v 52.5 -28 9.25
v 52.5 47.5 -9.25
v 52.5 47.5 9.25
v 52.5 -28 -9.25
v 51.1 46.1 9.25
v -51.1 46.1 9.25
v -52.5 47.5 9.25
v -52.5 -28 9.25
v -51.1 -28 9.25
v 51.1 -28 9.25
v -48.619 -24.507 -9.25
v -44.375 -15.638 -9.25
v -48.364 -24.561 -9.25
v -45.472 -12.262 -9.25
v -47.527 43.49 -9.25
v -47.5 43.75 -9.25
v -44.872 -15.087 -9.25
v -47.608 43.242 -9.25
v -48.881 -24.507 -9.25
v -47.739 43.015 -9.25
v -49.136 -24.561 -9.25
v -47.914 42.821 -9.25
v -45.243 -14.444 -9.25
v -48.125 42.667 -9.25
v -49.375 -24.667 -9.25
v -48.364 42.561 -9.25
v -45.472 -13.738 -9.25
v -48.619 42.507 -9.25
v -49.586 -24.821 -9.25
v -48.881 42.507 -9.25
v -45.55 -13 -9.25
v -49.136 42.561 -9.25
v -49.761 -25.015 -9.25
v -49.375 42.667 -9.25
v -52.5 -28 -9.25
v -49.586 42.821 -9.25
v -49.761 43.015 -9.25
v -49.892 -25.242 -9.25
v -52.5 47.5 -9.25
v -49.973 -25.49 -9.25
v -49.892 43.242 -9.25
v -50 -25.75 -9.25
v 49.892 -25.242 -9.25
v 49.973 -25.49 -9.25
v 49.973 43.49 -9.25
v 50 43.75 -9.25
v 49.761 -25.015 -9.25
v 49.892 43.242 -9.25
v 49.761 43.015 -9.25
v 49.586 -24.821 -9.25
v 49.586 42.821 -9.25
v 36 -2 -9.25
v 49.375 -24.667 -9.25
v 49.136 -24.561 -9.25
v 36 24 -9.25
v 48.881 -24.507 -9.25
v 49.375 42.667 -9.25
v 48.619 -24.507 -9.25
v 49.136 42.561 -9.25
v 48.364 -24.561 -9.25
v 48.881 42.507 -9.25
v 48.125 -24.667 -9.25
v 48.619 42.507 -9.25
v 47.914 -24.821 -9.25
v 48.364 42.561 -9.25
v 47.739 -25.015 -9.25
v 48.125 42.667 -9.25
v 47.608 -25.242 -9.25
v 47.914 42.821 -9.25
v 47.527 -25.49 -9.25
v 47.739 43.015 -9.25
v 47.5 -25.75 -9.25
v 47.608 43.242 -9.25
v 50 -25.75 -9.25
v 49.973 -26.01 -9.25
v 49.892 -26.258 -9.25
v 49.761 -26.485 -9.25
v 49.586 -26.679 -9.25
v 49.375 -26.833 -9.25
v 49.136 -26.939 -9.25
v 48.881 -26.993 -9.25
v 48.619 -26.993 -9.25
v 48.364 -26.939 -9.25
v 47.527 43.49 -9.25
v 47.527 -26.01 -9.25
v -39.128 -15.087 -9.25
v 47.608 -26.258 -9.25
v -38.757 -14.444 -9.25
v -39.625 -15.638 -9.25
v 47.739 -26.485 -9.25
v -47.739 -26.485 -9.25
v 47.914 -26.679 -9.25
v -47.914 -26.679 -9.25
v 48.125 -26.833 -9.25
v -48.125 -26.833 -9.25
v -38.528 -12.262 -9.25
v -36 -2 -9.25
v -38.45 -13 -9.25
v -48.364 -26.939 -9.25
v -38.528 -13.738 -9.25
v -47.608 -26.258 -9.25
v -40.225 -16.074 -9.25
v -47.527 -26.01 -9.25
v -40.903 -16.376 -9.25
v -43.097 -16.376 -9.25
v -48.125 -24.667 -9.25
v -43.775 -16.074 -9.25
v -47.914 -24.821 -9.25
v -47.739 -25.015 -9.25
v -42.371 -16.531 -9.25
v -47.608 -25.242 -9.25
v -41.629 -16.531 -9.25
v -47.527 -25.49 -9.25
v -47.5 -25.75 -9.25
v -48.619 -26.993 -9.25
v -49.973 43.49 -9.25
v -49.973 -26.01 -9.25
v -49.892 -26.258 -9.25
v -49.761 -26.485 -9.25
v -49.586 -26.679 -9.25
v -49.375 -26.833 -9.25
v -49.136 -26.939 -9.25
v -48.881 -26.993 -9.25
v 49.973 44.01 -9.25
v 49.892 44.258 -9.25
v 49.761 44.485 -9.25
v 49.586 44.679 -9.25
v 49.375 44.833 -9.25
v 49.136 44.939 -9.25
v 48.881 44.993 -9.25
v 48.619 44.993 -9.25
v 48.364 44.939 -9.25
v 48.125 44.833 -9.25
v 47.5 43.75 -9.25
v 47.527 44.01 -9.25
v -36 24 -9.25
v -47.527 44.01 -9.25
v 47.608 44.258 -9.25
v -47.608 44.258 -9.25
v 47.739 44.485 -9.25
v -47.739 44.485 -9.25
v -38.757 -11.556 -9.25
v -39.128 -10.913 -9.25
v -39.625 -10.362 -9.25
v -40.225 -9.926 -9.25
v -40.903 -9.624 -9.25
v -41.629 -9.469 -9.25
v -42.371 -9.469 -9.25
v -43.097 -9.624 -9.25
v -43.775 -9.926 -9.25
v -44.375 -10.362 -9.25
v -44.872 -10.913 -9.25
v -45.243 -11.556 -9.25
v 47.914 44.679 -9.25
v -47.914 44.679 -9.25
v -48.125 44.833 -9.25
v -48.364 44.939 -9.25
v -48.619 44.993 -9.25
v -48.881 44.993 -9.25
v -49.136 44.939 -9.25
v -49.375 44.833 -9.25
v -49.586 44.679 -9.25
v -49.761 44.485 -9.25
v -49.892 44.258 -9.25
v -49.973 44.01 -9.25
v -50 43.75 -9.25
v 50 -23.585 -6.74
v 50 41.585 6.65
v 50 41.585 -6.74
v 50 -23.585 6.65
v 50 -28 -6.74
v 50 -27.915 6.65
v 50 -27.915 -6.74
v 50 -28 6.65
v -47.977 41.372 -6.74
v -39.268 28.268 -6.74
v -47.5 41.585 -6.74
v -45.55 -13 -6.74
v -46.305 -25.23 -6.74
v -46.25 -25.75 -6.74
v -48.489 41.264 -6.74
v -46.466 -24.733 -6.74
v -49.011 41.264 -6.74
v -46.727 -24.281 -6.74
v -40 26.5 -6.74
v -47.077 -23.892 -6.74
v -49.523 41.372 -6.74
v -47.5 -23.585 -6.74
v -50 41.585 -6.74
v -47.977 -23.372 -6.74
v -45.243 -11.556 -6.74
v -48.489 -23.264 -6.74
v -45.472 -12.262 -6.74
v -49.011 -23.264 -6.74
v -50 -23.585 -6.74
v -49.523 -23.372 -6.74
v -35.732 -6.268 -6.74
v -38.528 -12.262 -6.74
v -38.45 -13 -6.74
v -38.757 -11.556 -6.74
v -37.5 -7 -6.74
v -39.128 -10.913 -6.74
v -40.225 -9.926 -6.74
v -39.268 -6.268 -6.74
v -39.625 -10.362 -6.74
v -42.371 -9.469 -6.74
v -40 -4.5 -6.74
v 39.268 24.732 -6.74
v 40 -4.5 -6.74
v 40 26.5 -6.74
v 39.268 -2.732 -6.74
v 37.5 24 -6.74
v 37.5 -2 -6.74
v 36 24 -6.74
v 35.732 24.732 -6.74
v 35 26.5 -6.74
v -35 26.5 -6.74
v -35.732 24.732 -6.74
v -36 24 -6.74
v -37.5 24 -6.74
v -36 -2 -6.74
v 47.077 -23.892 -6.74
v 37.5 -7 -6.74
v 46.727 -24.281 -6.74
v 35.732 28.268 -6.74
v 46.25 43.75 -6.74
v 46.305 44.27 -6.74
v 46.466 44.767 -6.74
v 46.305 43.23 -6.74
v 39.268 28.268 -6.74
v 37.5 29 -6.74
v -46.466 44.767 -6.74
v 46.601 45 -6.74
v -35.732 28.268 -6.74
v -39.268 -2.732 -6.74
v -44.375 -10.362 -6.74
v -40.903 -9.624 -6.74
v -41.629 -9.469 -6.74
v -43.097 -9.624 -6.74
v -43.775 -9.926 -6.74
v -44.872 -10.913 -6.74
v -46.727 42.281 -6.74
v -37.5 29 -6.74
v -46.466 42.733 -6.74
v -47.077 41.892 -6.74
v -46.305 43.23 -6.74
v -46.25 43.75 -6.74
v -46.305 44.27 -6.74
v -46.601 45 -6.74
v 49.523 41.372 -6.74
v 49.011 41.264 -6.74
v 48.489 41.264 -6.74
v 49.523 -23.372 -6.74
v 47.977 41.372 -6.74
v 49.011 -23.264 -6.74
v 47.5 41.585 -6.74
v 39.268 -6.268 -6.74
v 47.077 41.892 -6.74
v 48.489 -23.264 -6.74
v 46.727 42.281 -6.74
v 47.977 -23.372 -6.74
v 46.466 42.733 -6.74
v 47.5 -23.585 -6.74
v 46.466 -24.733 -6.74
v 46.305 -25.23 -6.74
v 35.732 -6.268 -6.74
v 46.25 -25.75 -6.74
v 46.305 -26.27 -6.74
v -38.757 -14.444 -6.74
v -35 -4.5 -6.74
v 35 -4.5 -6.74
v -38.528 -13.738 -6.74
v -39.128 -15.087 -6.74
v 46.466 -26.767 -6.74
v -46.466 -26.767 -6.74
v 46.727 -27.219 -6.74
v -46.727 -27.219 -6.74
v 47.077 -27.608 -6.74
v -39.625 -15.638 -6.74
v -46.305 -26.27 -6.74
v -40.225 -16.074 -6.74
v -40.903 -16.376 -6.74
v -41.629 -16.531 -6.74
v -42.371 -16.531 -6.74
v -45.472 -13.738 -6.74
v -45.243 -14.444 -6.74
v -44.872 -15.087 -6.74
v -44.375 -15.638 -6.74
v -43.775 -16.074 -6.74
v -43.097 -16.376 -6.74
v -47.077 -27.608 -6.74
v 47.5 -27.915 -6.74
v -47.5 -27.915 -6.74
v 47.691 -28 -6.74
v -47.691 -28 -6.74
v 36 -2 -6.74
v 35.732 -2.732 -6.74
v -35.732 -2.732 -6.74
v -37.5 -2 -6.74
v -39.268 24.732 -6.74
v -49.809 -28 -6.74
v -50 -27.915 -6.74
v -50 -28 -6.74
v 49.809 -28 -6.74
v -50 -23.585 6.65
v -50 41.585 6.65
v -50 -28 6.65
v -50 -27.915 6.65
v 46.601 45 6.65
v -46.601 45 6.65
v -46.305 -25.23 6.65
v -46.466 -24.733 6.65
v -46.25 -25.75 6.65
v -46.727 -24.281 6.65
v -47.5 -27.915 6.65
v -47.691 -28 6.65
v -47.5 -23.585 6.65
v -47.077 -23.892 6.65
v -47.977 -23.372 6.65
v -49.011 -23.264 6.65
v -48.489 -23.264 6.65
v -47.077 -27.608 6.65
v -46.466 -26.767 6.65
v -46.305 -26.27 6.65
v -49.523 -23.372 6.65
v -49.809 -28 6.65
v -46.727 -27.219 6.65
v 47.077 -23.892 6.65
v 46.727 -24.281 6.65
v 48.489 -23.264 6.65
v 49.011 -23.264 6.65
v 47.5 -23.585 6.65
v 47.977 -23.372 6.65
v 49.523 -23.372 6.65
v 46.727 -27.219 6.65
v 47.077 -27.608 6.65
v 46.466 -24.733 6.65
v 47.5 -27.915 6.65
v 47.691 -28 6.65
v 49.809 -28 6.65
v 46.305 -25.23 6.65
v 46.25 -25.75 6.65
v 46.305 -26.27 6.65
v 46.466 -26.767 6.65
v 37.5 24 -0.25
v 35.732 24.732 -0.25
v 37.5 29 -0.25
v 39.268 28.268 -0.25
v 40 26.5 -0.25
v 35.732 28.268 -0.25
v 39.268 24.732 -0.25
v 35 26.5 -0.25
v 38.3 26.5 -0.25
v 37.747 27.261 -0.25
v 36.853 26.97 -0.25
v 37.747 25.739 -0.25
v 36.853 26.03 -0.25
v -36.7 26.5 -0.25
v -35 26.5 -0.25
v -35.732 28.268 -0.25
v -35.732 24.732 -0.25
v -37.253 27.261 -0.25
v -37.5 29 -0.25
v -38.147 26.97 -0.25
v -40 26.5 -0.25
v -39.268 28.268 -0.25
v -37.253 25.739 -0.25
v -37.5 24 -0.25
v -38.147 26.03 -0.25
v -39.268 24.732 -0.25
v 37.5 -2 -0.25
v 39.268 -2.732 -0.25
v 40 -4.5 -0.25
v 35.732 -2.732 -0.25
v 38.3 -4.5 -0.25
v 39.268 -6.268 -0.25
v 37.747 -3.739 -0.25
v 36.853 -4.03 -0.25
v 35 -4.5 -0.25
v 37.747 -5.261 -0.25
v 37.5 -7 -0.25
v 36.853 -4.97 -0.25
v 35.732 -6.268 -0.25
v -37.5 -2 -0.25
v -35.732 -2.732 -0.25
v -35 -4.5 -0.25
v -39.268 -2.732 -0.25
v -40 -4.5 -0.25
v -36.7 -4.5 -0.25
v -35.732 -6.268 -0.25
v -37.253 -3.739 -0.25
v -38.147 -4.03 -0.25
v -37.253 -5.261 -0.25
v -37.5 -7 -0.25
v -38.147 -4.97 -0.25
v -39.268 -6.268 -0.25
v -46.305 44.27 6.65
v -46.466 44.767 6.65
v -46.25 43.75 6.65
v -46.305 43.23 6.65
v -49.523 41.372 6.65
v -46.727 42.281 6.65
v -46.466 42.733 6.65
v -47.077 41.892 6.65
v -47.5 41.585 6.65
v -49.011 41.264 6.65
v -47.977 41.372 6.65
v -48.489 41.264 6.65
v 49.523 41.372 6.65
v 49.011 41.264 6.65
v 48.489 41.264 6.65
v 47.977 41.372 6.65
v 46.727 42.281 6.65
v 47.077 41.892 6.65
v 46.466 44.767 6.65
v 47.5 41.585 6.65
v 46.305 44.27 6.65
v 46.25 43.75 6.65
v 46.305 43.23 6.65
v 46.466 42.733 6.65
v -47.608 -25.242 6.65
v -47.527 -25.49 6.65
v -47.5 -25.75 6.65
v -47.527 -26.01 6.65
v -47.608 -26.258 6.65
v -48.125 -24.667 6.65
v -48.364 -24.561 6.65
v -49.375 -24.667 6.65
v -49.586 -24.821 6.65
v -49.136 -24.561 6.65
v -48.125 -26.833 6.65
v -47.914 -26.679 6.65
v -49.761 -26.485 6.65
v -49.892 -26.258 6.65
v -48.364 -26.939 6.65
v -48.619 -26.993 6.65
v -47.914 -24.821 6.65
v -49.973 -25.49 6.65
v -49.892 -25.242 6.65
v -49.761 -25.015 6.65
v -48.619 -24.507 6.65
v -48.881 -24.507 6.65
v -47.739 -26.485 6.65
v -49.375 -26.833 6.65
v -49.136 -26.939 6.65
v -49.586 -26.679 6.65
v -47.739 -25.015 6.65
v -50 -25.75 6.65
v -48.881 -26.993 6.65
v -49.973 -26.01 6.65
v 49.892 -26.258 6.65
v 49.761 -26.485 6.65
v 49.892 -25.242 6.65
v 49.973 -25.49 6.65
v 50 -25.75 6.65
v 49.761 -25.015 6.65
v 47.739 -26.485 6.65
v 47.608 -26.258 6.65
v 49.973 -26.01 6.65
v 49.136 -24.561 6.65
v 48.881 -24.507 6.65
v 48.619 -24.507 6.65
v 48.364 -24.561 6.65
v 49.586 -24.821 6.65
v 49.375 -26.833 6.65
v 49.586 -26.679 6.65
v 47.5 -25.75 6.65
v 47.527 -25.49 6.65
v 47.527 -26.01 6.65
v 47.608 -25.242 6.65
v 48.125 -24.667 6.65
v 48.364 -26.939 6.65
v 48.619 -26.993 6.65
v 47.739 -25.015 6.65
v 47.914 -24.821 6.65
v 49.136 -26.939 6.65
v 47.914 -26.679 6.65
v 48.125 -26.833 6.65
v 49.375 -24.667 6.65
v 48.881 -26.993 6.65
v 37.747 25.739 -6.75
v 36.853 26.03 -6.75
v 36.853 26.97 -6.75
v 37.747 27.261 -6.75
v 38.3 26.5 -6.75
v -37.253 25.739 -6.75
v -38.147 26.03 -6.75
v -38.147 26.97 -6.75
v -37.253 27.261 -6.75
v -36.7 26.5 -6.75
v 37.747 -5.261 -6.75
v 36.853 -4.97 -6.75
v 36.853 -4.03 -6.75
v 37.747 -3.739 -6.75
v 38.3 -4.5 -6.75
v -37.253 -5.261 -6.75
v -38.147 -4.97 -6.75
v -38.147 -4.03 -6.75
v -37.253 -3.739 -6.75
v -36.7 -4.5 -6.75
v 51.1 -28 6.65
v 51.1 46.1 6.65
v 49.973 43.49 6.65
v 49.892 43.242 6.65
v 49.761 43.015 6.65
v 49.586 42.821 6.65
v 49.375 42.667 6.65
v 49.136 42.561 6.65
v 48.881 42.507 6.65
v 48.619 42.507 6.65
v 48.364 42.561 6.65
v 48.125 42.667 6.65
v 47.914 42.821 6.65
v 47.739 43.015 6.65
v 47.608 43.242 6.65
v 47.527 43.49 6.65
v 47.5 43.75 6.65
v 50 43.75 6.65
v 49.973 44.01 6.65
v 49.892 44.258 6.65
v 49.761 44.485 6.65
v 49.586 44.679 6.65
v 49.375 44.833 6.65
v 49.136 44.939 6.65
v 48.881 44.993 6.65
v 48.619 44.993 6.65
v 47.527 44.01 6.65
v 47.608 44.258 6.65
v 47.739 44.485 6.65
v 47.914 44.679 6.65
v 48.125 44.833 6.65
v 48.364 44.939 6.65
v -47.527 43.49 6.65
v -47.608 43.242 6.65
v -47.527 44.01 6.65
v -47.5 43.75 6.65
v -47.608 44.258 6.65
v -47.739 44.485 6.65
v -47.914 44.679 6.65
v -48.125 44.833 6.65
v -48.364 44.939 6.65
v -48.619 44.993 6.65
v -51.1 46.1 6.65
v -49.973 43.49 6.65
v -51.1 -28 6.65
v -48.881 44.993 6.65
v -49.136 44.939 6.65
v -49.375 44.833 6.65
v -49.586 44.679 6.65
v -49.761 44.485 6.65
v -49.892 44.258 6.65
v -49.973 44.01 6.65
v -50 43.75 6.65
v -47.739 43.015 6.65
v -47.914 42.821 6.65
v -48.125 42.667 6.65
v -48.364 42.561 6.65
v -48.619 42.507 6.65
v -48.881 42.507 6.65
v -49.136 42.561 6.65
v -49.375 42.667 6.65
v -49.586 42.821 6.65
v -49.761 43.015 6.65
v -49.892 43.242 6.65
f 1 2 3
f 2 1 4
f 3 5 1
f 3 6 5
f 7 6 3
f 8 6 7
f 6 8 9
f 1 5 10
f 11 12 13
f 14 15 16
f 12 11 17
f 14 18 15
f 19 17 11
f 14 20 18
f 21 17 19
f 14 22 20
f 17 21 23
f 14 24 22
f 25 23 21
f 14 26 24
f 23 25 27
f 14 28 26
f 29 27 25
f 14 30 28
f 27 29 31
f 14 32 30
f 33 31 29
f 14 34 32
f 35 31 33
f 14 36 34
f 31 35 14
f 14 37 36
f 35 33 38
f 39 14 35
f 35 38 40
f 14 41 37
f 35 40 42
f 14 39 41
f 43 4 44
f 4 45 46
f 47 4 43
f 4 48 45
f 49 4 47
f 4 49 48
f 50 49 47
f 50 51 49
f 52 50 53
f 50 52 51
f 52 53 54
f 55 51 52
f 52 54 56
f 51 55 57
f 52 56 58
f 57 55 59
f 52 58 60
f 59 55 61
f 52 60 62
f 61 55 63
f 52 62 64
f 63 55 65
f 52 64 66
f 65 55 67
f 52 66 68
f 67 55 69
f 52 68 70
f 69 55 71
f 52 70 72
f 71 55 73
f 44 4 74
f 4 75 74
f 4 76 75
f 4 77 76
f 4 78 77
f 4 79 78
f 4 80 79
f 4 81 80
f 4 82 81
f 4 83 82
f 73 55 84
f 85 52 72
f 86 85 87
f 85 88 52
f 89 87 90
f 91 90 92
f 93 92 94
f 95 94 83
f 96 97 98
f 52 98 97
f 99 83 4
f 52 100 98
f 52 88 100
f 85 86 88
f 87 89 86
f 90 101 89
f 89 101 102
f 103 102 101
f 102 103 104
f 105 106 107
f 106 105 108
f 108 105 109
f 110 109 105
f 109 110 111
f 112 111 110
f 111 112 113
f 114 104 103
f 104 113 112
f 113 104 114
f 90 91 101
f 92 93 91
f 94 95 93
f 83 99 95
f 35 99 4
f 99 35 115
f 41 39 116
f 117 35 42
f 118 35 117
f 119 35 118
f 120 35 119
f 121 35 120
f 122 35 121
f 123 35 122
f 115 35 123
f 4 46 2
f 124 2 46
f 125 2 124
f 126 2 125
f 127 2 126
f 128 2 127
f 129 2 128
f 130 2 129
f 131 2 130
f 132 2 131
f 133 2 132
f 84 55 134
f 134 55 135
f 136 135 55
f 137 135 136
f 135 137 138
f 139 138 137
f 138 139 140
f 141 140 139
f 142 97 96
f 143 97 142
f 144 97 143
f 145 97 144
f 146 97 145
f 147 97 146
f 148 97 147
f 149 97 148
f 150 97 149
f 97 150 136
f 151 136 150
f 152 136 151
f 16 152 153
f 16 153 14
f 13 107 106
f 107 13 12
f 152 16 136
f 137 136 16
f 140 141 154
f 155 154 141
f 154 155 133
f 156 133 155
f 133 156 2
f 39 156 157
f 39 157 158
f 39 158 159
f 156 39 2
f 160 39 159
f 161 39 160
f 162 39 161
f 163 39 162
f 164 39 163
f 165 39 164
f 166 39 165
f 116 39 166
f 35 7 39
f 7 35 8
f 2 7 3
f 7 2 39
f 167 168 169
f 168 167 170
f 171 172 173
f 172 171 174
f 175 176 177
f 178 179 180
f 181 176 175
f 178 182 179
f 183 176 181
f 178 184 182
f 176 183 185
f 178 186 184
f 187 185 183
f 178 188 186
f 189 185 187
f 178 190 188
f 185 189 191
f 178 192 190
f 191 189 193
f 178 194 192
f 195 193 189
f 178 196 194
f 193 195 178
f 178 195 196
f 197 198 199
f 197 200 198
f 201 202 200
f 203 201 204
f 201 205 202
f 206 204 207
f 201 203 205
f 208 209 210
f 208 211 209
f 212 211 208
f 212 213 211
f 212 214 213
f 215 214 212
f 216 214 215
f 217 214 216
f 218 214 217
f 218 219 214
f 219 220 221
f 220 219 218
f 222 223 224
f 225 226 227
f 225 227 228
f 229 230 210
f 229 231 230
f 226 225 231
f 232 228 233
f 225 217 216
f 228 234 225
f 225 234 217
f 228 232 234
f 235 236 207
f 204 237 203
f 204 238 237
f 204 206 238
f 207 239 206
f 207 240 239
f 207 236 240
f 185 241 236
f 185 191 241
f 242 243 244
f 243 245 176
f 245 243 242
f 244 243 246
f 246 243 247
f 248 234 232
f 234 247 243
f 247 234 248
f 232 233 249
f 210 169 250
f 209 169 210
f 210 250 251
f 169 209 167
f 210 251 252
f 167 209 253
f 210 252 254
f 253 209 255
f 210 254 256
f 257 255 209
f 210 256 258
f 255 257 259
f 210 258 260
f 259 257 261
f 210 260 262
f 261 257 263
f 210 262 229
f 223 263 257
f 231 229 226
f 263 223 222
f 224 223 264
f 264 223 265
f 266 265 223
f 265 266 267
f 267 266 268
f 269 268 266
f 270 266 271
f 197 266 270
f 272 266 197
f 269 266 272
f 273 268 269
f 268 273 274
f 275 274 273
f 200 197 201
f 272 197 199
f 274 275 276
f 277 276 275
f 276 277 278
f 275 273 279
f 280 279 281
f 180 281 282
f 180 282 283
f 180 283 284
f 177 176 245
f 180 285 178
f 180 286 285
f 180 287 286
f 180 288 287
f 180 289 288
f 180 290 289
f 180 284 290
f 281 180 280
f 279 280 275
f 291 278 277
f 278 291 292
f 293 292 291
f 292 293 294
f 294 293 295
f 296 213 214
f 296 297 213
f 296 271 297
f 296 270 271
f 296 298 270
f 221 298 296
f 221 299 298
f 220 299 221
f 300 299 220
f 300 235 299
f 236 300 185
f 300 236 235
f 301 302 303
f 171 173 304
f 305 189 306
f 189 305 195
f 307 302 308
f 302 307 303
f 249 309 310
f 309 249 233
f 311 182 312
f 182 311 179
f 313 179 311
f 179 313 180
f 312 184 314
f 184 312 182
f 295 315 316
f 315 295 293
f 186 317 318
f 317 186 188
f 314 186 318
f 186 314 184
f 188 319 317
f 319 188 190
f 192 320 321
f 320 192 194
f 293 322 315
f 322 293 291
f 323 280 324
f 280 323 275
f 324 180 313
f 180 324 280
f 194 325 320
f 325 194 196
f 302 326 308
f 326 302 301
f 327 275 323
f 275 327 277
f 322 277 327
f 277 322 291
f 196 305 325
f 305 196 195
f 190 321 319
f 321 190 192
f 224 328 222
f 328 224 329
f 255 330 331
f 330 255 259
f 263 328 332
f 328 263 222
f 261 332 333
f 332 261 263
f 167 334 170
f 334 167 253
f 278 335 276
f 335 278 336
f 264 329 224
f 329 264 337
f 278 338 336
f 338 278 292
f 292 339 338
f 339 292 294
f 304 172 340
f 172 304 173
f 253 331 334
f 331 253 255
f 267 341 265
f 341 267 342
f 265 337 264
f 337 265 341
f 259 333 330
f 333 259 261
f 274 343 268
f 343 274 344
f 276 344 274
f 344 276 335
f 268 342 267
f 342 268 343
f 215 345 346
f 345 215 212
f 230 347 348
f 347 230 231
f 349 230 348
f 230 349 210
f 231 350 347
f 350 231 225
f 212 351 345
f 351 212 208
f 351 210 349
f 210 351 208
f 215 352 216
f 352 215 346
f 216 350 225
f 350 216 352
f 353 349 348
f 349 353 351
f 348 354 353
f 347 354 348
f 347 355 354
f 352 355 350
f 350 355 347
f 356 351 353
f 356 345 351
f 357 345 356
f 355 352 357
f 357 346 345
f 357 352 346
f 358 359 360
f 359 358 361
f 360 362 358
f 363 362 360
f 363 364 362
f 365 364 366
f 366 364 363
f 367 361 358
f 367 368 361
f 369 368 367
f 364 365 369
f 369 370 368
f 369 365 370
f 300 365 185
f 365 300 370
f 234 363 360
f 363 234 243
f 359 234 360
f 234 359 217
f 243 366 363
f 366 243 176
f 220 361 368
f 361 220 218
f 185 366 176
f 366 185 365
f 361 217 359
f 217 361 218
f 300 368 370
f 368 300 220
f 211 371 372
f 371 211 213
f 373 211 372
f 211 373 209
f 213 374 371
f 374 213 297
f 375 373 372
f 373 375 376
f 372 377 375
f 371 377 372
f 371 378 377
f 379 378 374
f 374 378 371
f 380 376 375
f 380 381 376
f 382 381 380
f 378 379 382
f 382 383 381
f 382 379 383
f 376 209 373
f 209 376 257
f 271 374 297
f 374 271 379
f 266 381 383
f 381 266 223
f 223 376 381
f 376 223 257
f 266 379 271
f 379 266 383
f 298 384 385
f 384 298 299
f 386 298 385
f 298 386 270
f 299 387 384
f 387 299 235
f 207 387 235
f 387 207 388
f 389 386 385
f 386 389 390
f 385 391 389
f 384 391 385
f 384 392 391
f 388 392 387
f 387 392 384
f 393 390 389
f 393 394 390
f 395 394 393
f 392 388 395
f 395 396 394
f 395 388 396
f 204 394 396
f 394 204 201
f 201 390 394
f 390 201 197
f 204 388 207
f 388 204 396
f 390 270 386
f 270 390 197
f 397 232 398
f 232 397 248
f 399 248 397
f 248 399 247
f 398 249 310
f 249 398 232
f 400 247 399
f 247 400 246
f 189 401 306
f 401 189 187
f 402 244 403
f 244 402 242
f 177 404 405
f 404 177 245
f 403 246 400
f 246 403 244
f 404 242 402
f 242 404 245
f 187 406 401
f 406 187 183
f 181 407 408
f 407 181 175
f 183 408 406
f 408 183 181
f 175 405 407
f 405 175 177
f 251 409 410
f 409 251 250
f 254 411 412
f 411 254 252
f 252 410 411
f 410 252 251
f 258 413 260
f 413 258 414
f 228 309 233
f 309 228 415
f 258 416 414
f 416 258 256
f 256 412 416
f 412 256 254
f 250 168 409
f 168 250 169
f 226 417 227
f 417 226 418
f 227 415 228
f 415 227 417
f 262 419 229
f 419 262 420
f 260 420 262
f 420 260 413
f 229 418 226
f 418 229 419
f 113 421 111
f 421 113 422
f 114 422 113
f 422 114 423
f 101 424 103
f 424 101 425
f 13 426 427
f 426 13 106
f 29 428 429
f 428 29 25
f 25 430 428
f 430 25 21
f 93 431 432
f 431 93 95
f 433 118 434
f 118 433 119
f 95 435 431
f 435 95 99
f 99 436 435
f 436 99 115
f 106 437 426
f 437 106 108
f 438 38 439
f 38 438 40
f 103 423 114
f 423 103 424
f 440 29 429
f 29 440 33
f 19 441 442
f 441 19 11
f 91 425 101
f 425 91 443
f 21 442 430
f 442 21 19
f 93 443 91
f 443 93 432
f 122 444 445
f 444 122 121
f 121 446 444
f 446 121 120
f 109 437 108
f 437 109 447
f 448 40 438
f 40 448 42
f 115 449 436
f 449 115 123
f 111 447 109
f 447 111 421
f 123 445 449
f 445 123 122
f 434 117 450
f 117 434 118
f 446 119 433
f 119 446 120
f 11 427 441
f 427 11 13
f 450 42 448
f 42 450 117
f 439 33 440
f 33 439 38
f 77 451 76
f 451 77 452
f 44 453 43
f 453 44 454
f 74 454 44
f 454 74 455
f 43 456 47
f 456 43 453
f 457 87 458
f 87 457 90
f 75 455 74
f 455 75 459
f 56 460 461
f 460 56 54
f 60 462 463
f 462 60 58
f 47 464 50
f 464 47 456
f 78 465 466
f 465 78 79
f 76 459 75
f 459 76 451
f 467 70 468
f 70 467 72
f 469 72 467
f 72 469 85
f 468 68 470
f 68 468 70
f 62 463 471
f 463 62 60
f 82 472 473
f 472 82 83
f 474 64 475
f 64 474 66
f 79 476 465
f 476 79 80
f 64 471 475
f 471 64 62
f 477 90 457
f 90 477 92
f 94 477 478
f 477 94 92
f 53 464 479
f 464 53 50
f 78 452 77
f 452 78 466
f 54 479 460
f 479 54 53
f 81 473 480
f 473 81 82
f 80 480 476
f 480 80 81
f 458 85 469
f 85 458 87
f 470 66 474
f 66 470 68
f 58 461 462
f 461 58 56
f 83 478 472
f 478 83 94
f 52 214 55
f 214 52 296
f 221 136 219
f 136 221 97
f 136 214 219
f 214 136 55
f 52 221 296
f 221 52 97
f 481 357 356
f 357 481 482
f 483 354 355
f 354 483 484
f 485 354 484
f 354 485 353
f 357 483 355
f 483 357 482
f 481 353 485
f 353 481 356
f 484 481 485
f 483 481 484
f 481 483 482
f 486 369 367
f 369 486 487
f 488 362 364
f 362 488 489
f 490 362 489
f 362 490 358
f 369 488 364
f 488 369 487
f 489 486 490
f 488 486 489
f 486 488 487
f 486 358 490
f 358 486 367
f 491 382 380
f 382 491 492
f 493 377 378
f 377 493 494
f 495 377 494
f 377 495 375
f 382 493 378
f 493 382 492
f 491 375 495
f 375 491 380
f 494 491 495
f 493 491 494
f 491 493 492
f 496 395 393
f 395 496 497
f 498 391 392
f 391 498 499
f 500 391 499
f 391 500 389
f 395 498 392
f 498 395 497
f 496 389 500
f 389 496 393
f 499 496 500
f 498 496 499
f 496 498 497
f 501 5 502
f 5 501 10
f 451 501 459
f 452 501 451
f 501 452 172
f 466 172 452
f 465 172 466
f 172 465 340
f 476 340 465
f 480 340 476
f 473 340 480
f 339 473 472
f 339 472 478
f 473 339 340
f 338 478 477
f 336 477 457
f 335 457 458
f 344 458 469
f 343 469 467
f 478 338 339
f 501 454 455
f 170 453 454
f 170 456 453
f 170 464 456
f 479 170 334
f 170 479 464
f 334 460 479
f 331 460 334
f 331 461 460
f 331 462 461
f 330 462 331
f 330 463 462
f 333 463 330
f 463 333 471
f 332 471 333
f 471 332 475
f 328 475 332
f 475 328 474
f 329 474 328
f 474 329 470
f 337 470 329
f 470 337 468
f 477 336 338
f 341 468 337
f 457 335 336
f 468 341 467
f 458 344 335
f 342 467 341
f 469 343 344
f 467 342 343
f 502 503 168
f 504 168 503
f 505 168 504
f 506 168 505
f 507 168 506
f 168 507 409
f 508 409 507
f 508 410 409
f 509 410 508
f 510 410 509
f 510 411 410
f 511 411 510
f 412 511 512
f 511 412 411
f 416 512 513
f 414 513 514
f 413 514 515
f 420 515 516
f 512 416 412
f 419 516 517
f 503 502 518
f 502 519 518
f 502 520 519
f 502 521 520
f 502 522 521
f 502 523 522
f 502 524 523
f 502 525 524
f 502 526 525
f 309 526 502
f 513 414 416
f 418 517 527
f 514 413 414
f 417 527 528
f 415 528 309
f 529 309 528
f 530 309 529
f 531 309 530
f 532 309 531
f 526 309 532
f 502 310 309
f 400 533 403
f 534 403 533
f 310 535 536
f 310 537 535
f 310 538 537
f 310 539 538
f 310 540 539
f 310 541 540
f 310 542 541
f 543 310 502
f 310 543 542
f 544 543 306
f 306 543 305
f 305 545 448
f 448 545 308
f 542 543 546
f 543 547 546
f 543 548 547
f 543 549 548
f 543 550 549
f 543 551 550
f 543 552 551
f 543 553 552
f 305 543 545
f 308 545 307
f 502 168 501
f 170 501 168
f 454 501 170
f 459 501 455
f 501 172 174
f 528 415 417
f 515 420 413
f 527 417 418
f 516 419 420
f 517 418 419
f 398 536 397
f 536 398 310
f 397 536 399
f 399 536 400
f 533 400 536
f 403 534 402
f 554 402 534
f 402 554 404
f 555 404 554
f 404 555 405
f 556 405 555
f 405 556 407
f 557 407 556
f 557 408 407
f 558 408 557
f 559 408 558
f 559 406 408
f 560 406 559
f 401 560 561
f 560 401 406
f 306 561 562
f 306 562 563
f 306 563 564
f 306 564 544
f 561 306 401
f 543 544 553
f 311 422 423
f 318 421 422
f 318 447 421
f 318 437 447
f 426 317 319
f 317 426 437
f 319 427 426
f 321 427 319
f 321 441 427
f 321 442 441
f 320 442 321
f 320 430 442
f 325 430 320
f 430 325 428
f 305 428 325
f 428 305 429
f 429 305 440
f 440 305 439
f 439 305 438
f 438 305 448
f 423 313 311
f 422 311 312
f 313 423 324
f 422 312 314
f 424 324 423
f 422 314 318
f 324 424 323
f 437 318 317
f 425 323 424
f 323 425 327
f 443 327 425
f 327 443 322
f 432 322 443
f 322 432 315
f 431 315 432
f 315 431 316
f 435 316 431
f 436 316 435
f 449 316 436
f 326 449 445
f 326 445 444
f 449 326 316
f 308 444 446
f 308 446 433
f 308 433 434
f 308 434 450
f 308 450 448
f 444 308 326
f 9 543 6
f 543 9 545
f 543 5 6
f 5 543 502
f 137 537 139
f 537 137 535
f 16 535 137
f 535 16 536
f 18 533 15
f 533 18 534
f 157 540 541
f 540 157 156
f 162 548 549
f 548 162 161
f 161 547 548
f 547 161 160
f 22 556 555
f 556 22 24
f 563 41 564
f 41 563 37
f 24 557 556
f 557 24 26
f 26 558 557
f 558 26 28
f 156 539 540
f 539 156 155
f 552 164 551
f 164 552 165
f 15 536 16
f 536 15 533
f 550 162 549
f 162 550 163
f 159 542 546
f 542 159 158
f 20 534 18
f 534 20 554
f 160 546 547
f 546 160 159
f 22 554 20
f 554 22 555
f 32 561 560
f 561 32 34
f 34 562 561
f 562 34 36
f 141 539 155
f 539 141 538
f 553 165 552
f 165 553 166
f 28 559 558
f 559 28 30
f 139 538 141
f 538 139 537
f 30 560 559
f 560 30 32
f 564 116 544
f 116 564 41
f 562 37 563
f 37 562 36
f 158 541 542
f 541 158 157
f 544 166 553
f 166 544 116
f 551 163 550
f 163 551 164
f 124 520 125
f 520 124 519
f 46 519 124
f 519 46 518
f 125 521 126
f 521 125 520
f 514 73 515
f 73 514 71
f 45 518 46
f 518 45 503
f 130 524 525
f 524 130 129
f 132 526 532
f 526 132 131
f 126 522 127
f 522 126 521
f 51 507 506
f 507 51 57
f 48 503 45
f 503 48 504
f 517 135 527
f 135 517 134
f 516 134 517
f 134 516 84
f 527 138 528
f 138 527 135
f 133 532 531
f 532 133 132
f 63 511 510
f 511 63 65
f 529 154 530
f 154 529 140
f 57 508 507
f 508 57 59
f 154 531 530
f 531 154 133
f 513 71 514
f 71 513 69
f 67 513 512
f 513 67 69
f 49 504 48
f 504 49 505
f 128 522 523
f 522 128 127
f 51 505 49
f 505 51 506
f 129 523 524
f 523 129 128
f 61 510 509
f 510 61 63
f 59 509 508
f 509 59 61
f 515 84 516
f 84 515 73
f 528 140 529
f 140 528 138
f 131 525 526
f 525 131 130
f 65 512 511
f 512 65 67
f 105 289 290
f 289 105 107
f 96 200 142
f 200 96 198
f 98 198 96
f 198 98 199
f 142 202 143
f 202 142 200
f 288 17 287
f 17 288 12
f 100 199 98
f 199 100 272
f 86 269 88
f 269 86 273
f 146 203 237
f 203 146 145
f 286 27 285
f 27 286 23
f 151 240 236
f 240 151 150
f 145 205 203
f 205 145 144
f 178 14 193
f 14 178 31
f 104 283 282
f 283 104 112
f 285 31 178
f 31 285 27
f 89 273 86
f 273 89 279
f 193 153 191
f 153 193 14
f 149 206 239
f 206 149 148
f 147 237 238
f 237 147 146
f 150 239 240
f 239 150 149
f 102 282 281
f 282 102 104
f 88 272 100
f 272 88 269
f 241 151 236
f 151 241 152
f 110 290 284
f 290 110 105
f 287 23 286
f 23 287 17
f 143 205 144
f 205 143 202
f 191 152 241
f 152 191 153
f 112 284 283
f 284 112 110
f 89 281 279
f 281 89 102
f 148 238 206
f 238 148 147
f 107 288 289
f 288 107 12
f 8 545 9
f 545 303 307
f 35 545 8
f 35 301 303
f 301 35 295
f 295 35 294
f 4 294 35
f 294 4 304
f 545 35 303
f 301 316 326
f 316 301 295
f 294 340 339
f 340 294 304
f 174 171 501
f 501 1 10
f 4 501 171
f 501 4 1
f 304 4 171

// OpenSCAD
xdim=100;
ydim=90;
zdim=25;
zdim2=16;
th=2.5;

BOTTOM=1;
TOP=2;
LCD_TOP=1;
LCD_BOTTOM=2;
part=TOP;
part2=LCD_TOP;
if(part==BOTTOM) {
    difference() 
    {
        union() {
            //box
            difference() {
                cube([xdim+2*th,ydim+2*th,zdim+th],true);
                translate([0,0,th/2+0.01]) cube([xdim,ydim,zdim],true);
            }
            // screw hole/mounts
            translate([0,-th/2+17/2,0]) {
                translate([-(xdim/2-th/2),-(ydim/2-th/2),th/2]) {
                    cylinder(h=zdim,d=5,$fn=30,center=true);
                }
                translate([(xdim/2-th/2),-(ydim/2-th/2),th/2]) {
                    cylinder(h=zdim,d=5,$fn=30,center=true);
                }
            }
            
            translate([-(xdim/2-th/2),(ydim/2-th/2),th/2]) {
                cylinder(h=zdim,d=5,$fn=30,center=true);
            }
            translate([(xdim/2-th/2),(ydim/2-th/2),th/2]) {
                cylinder(h=zdim,d=5,$fn=30,center=true);
            }
            translate([0,18,0]) {
                translate([-(xdim/2-th/2),-(ydim/2-th/2),th/2]) {
                    cylinder(h=zdim,d=5,$fn=30,center=true);
                }
                translate([(xdim/2-th/2),-(ydim/2-th/2),th/2]) {
                    cylinder(h=zdim,d=5,$fn=30,center=true);
                }
            }
            // arduino mounts
            translate([-(xdim/2)+21-th,(ydim/2)-17,-(zdim/2)+5/2+th/2]) {
                cylinder(h=5,d=4.5,$fn=30,center=true);
            }
            translate([-(xdim/2)+21-th-1.3,(ydim/2)-17-48,-(zdim/2)+5/2+th/2]) {
                cylinder(h=5,d=4.5,$fn=30,center=true);
            }
            translate([-(xdim/2)+21-th+64.4-13.6,(ydim/2)-17-15.3,-(zdim/2)+5/2+th/2]) {
                cylinder(h=5,d=4.5,$fn=30,center=true);
            }
            translate([-(xdim/2)+21-th+64.4-13.6,(ydim/2)-17-(44.12-1),-(zdim/2)+5/2+th/2]) {
                cylinder(h=5,d=4.5,$fn=30,center=true);
            }

            
            
            
            // slot
            difference() {
                translate([0,0,zdim/2+th/2-1.5+3-1]) cube([xdim+2,ydim+2,3],true);
                translate([0,0,zdim/2+th/2-1.5+3-1]) cube([xdim,ydim,3.1],true);
            }                
        }
        

        // screw hole/mounts
        translate([0,-th/2+17/2,0]) {
            translate([-(xdim/2-th/2),-(ydim/2-th/2),th/2]) {
                cylinder(h=zdim,d=1.5,$fn=30,center=true);
            }
            translate([(xdim/2-th/2),-(ydim/2-th/2),th/2]) {
                cylinder(h=zdim,d=1.5,$fn=30,center=true);
            }
        }
        translate([-(xdim/2-th/2),(ydim/2-th/2),th/2]) {
            cylinder(h=zdim,d=1.5,$fn=30,center=true);
        }
        translate([(xdim/2-th/2),(ydim/2-th/2),th/2]) {
            cylinder(h=zdim,d=1.5,$fn=30,center=true);
        }
        translate([0,18,0]) {
            translate([-(xdim/2-th/2),-(ydim/2-th/2),th/2]) {
                cylinder(h=zdim,d=1.5,$fn=30,center=true);
            }
            translate([(xdim/2-th/2),-(ydim/2-th/2),th/2]) {
                cylinder(h=zdim,d=1.5,$fn=30,center=true);
            }
        }

        // arduino mounts
        translate([-(xdim/2)+21-th,(ydim/2)-17,-(zdim/2)+5/2+th/2]) {
            cylinder(h=5,d=1.5,$fn=30,center=true);
        }
        translate([-(xdim/2)+21-th-1.3,(ydim/2)-17-48,-(zdim/2)+5/2+th/2]) {
            cylinder(h=5,d=1.5,$fn=30,center=true);
        }
        translate([-(xdim/2)+21-th+64.4-13.6,(ydim/2)-17-15.3,-(zdim/2)+5/2+th/2]) {
            cylinder(h=5,d=1.5,$fn=30,center=true);
        }
        translate([-(xdim/2)+21-th+64.4-13.6,(ydim/2)-17-(44.12-1),-(zdim/2)+5/2+th/2]) {
            cylinder(h=5,d=1.5,$fn=30,center=true);
        }

        // usb
        translate([-(xdim/2),(ydim/2)-17-12.5,-(zdim/2)+th/2+12/2+7]) cube([10,13,12],true);

        // aerial
        translate([21-th-(xdim/2)+74-13.6-1,(ydim/2),-1]) rotate([90,0,0]) cylinder(h=10,d=11,center=true);
        
        // switch
        translate([-xdim/2,-5,11]) rotate([90,0,0]) switch();
        

    }
    
    translate([-15,-(ydim/2)+17./2,-(zdim/2)+th/2+15/2]) battery_holder();
} else if(part==TOP) {
    difference() 
    {
        union() {
            //box
            difference() {
                cube([xdim+2*th,ydim+2*th,zdim2+th],true);
                translate([0,0,th/2+0.01]) cube([xdim,ydim,zdim2],true);
            }
            // screw hole/mounts
            translate([0,-th/2+17/2,0]) {
                translate([-(xdim/2-th/2),-(ydim/2-th/2),th/2]) {
                    cylinder(h=zdim2,d=5,$fn=30,center=true);
                }
                translate([(xdim/2-th/2),-(ydim/2-th/2),th/2]) {
                    cylinder(h=zdim2,d=5,$fn=30,center=true);
                }
            }
            
            translate([-(xdim/2-th/2),(ydim/2-th/2),th/2]) {
                cylinder(h=zdim2,d=5,$fn=30,center=true);
            }
            translate([(xdim/2-th/2),(ydim/2-th/2),th/2]) {
                cylinder(h=zdim2,d=5,$fn=30,center=true);
            }
            translate([0,18,0]) {
                translate([-(xdim/2-th/2),-(ydim/2-th/2),th/2]) {
                    cylinder(h=zdim2,d=5,$fn=30,center=true);
                }
                translate([(xdim/2-th/2),-(ydim/2-th/2),th/2]) {
                    cylinder(h=zdim2,d=5,$fn=30,center=true);
                }
            }
            
            
            // mounts for LCD
            
            // hole for LCD
            translate([0,(ydim/2)-34,-zdim2/2+(9-th)/2+th/2]) {
                translate([75/2,31/2,0]) cylinder(d=5,h=9-th,center=true);
                translate([-75/2,31/2,0]) cylinder(d=5,h=9-th,center=true);
                translate([75/2,-31/2,0]) cylinder(d=5,h=9-th,center=true);
                translate([-75/2,-31/2,0]) cylinder(d=5,h=9-th,center=true);
            }
            
            
        }
        // slot
        translate([0,0,zdim2/2+th/2+2.6/2-2.6]) cube([xdim+2.2,ydim+2.2,2.6],true);
        // screw hole/mounts
        translate([0,-th/2+17/2,0]) {
            translate([-(xdim/2-th/2),-(ydim/2-th/2),th/2]) {
                cylinder(h=zdim,d=2.5,$fn=30,center=true);
            }
            translate([(xdim/2-th/2),-(ydim/2-th/2),th/2]) {
                cylinder(h=zdim,d=2.5,$fn=30,center=true);
            }
        }
        translate([-(xdim/2-th/2),(ydim/2-th/2),th/2]) {
            cylinder(h=zdim,d=2.5,$fn=30,center=true);
        }
        translate([(xdim/2-th/2),(ydim/2-th/2),th/2]) {
            cylinder(h=zdim,d=2.5,$fn=30,center=true);
        }
        translate([0,18,0]) {
            translate([-(xdim/2-th/2),-(ydim/2-th/2),th/2]) {
                cylinder(h=zdim,d=2.5,$fn=30,center=true);
            }
            translate([(xdim/2-th/2),-(ydim/2-th/2),th/2]) {
                cylinder(h=zdim,d=2.5,$fn=30,center=true);
            }
        }
        
        // hole for button:
        translate([-xdim/2+8,-ydim/2+32,0]) cylinder(d=7.1,h=50,$fn=30,center=true);
        
        // hole for LCD
        translate([0,(ydim/2)-34,-zdim2/2+(20)/2+th/2]) {
            cube([72,26,100],true);
            translate([75/2,31/2,0]) cylinder(d=1.6,h=20,center=true);
            translate([-75/2,31/2,0]) cylinder(d=1.6,h=20,center=true);
            translate([75/2,-31/2,0]) cylinder(d=1.6,h=20,center=true);
            translate([-75/2,-31/2,0]) cylinder(d=1.6,h=20,center=true);
        }
        
        // split them
        //translate([0,-ydim/2+17,0]) cube([2*xdim,0.5,zdim],true);
        if(part2==LCD_TOP) {
            translate([0,-ydim/2+17-200/2,0]) cube([2*xdim,200,zdim],true);
        } else if(part2==LCD_BOTTOM) {
            translate([0,-ydim/2+17+200/2-0.5,0]) cube([2*xdim,200,zdim],true);
        }
        
    }    
}

module battery_holder() 
{
    difference() {
        cube([60+th*2,17.+th*2,15+th*2],true);
        translate([0,0,th]) cube([60,17,15+th*2],true);
    }
}


module switch() 
{
    rotate([90,0,90]) {
        translate([0,15/2,0]) cylinder(d=3,h=10,$fn=30,center=true);
        translate([0,-15/2,0]) cylinder(d=3,h=10,$fn=30,center=true);
        translate([0,0,0]) cube([4,7,10],true);
    }
}
